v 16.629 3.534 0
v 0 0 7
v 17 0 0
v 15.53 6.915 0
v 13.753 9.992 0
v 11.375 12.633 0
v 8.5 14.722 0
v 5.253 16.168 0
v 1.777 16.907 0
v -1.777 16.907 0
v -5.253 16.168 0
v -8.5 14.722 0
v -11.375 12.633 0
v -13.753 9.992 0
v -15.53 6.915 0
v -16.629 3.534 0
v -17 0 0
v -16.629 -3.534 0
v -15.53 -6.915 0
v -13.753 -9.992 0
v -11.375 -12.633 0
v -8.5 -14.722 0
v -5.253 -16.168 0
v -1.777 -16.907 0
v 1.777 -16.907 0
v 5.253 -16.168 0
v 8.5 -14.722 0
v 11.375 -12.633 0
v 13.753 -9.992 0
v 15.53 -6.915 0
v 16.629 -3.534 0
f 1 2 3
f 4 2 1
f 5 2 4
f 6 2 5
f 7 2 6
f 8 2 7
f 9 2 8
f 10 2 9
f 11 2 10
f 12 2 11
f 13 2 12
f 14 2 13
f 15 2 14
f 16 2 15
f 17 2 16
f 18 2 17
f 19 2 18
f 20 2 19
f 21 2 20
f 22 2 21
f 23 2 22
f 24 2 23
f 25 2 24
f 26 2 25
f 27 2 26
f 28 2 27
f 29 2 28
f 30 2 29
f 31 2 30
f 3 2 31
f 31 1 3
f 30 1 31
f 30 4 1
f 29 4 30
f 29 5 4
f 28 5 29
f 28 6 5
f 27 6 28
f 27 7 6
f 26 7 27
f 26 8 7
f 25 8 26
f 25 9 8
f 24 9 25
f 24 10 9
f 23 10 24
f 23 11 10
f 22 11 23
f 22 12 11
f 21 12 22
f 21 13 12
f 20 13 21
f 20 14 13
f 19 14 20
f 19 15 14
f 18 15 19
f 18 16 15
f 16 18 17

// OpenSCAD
// Generated by SolidPython 1.0.1 on 2020-07-29 00:46:43


cylinder(h = 7, r1 = 17, r2 = 0);
/***********************************************
*********      SolidPython code:      **********
************************************************
 
# import packages: SolidPython
from solid import *
from solid.utils import *
from itertools import chain, combinations, permutations


class Resize:

    def __init__(self, scad_file):
        self.scad_file = scad_file
        #self.scad_file = import_scad(scad_file)
        # cone/cylinder param:
        self.r1 = 0
        self.r2 = 0
        self.h = 0
        # rectangular prism param:
        self.w = 0
        self.l = 0
        # ellipse param:
        self.r = 0

    # import OpenScad code (file name corresponds to shape)


    # classify shape + parameters
    def assign(self, param1, param2, param3):
        if self.scad_file == 'cone.scad':
            self.r1 = param1
            self.r2 = param2
            self.h = param3
        elif self.scad_file == 'cylinder.scad':
            self.r1 = param1
            self.r2 = param2
            self.h = param3
        elif self.scad_file == 'rectangularPrism.scad':
            self.h = param1
            self.l = param2
            self.w = param3
        else:
            self.r = param1
            self.h = param2

    # resize parameters
    def iterate(self):
        x = range(3, 20, 2)
        i = 1
        if self.scad_file == 'cone.scad':
            tempList = list(permutations(x, 2))
            for temp in tempList:
                param1 = temp[0]
                param2 = temp[1]
                filepath = 'produced_scad_files/' + 'cone' + str(param1) + '_' + str(param2) + '_' + '.scad'
                scad_render_to_file(cylinder(h=param1, r1=param2, r2=0), filepath)

        elif self.scad_file == 'cylinder.scad':
            tempList = list(permutations(x, 3))
            for temp in tempList:
                param1 = temp[0]
                param2 = temp[1]
                filepath = 'produced_scad_files/' + 'cylinder' + str(param1) + '_' + str(param2) + '_' + '.scad'
                scad_render_to_file(cylinder(h=param1, r1=param2, r2=param2), filepath)

        elif self.scad_file == 'rectangularPrism.scad':
            tempList = list(permutations(x, 3))
            for temp in tempList:
                param1 = temp[0]
                param2 = temp[1]
                param3 = temp[2]
                filepath = 'produced_scad_files/' + 'rectangularPrism' + str(param1) + '_' + str(param2) + '_' + str(
                    param3) + '.scad'
                scad_render_to_file(cube(size=(param1, param2, param3)), filepath)

        elif self.scad_file == 'ellipse.scad':
            tempList = list(permutations(x, 4))
            for temp in tempList:
                param1 = temp[0]
                param2 = temp[1]
                param3 = temp[2]
                param4 = temp[3]
                filepath = 'produced_scad_files/' + 'ellipse' + str(param1) + '_' + str(param2) + '_' + str(param3) + '_' + str(param4) + '.scad'
                scad_render_to_file(scale([param1, param2, param3])(sphere(r=param4)), filepath)

    def render_to_scadfile(self):
        scad_render_to_file(scad, 'example.scad') 
 
************************************************/
